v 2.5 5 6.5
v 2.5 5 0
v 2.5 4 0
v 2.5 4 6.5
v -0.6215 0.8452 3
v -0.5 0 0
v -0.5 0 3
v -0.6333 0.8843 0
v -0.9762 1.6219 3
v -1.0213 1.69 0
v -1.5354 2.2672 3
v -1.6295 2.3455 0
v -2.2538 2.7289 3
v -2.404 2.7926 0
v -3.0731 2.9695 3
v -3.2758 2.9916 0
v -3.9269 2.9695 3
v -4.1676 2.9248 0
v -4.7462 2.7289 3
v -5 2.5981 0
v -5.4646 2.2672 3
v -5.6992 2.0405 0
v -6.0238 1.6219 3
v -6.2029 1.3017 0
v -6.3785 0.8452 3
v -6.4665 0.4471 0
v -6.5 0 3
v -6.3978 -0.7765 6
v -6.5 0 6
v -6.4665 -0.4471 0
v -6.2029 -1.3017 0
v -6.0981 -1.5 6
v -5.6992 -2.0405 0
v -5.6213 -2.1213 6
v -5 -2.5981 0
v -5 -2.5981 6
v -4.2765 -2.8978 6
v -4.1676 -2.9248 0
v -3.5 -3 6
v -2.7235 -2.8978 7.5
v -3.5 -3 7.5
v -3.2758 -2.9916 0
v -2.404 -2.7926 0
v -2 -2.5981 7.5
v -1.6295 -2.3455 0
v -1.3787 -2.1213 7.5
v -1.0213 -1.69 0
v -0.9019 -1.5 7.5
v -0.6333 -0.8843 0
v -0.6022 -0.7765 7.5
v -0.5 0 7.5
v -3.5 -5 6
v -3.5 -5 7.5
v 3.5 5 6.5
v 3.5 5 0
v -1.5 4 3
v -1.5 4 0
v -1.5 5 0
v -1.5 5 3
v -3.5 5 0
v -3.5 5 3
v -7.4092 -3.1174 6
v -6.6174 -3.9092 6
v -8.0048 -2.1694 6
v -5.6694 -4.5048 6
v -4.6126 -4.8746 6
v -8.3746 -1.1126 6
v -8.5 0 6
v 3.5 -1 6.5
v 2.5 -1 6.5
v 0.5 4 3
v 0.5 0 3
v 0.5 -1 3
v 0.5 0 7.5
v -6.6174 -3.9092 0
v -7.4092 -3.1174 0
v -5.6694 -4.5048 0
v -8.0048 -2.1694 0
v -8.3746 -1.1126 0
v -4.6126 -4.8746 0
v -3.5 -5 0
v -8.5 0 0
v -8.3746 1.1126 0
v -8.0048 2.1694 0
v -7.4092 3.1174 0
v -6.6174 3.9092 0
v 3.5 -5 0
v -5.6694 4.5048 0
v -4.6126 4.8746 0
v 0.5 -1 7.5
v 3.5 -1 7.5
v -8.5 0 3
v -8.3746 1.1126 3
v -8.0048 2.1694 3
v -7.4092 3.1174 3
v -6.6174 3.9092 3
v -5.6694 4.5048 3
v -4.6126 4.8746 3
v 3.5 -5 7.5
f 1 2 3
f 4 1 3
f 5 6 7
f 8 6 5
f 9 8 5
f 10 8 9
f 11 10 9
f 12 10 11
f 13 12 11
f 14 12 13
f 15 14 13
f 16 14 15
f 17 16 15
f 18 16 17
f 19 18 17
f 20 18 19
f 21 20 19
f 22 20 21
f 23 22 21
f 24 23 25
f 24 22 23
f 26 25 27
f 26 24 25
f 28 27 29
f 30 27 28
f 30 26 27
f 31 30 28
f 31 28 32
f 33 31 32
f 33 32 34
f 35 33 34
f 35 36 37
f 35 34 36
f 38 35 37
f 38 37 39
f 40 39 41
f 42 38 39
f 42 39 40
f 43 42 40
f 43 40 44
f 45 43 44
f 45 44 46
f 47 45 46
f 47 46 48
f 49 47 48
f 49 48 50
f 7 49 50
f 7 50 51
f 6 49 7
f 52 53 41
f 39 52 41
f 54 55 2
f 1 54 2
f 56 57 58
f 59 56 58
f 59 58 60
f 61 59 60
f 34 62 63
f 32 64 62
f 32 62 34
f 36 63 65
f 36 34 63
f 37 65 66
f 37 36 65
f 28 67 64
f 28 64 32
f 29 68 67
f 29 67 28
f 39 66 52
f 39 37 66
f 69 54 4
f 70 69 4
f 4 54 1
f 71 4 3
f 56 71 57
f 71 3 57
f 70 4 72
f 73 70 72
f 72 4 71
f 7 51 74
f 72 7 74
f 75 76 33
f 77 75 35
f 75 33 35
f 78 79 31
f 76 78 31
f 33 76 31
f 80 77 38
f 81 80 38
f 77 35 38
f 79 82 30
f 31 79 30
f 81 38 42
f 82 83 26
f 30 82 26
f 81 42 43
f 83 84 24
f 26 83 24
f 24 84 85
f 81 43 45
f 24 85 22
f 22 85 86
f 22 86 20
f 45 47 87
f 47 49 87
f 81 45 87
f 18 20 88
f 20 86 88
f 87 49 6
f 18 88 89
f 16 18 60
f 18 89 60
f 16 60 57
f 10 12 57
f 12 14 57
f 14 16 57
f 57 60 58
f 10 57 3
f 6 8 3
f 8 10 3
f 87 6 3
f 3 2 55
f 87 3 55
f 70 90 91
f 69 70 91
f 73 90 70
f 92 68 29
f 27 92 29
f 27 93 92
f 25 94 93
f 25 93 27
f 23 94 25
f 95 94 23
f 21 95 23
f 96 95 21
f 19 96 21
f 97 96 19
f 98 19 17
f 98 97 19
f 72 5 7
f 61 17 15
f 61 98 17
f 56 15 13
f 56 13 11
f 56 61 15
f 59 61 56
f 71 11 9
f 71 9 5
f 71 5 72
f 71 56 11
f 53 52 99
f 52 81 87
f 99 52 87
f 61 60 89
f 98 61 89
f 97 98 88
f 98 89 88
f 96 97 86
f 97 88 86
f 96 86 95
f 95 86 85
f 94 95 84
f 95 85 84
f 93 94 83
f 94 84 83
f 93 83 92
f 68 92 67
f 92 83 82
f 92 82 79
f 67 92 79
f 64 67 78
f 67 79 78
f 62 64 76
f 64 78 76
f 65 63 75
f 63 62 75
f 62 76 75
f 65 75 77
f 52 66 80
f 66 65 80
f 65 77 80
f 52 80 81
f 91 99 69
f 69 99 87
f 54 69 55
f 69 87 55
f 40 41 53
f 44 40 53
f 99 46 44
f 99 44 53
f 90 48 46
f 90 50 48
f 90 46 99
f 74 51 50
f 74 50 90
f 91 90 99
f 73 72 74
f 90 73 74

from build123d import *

# Parameters (mm, degrees)
SKETCH1_R           = 3
BOSS_EXTRUDE1_DEPTH = 7.5
SKETCH2_W           = 9
SKETCH2_H           = 5
CUT_EXTRUDE1_DEPTH  = 4.5
SKETCH3_W           = 5
SKETCH3_H           = 5
CUT_EXTRUDE2_DEPTH  = 1.5
CUT_EXTRUDE3_DEPTH  = 6


with BuildPart() as part:
    # Sketch1 → Boss-Extrude1 (new body)
    with BuildSketch(Plane.XY):
        with BuildLine():
            Line((-1.5, 5), (-3.5, 5))
            ThreePointArc((-3.5, 5), (-8.5, 0), (-3.5, -5))
            Line((-3.5, -5), (3.5, -5))
            Line((3.5, -5), (3.5, 5))
            Line((3.5, 5), (2.5, 5))
            Line((2.5, 5), (2.5, 4))
            Line((2.5, 4), (-1.5, 4))
            Line((-1.5, 4), (-1.5, 5))
        make_face()
        with Locations((-3.5, 0)):
            Circle(SKETCH1_R, mode=Mode.SUBTRACT)
    extrude(amount=BOSS_EXTRUDE1_DEPTH)

    # Sketch2 → Cut-Extrude1 (cut)
    with BuildSketch(Plane.XY.offset(7.5)):
        with Locations((-4, 2.5)):
            Rectangle(SKETCH2_W, SKETCH2_H)
    extrude(amount=-CUT_EXTRUDE1_DEPTH, mode=Mode.SUBTRACT)

    # Sketch3 → Cut-Extrude2 (cut)
    with BuildSketch(Plane.XY.offset(7.5)):
        with Locations((-6, -2.5)):
            Rectangle(SKETCH3_W, SKETCH3_H)
    extrude(amount=-CUT_EXTRUDE2_DEPTH, mode=Mode.SUBTRACT)

    # Sketch4 → Cut-Extrude3 (cut)
    with BuildSketch(Plane(origin=(0, 5, 0), x_dir=(1, 0, 0), z_dir=(0, 1, 0))):
        Polygon((3.5, -6.5), (2.5, -6.5), (0.5, -3), (0.5, -7.5), (3.5, -7.5), align=None)
    extrude(amount=-CUT_EXTRUDE3_DEPTH, mode=Mode.SUBTRACT)


solid = part.part
